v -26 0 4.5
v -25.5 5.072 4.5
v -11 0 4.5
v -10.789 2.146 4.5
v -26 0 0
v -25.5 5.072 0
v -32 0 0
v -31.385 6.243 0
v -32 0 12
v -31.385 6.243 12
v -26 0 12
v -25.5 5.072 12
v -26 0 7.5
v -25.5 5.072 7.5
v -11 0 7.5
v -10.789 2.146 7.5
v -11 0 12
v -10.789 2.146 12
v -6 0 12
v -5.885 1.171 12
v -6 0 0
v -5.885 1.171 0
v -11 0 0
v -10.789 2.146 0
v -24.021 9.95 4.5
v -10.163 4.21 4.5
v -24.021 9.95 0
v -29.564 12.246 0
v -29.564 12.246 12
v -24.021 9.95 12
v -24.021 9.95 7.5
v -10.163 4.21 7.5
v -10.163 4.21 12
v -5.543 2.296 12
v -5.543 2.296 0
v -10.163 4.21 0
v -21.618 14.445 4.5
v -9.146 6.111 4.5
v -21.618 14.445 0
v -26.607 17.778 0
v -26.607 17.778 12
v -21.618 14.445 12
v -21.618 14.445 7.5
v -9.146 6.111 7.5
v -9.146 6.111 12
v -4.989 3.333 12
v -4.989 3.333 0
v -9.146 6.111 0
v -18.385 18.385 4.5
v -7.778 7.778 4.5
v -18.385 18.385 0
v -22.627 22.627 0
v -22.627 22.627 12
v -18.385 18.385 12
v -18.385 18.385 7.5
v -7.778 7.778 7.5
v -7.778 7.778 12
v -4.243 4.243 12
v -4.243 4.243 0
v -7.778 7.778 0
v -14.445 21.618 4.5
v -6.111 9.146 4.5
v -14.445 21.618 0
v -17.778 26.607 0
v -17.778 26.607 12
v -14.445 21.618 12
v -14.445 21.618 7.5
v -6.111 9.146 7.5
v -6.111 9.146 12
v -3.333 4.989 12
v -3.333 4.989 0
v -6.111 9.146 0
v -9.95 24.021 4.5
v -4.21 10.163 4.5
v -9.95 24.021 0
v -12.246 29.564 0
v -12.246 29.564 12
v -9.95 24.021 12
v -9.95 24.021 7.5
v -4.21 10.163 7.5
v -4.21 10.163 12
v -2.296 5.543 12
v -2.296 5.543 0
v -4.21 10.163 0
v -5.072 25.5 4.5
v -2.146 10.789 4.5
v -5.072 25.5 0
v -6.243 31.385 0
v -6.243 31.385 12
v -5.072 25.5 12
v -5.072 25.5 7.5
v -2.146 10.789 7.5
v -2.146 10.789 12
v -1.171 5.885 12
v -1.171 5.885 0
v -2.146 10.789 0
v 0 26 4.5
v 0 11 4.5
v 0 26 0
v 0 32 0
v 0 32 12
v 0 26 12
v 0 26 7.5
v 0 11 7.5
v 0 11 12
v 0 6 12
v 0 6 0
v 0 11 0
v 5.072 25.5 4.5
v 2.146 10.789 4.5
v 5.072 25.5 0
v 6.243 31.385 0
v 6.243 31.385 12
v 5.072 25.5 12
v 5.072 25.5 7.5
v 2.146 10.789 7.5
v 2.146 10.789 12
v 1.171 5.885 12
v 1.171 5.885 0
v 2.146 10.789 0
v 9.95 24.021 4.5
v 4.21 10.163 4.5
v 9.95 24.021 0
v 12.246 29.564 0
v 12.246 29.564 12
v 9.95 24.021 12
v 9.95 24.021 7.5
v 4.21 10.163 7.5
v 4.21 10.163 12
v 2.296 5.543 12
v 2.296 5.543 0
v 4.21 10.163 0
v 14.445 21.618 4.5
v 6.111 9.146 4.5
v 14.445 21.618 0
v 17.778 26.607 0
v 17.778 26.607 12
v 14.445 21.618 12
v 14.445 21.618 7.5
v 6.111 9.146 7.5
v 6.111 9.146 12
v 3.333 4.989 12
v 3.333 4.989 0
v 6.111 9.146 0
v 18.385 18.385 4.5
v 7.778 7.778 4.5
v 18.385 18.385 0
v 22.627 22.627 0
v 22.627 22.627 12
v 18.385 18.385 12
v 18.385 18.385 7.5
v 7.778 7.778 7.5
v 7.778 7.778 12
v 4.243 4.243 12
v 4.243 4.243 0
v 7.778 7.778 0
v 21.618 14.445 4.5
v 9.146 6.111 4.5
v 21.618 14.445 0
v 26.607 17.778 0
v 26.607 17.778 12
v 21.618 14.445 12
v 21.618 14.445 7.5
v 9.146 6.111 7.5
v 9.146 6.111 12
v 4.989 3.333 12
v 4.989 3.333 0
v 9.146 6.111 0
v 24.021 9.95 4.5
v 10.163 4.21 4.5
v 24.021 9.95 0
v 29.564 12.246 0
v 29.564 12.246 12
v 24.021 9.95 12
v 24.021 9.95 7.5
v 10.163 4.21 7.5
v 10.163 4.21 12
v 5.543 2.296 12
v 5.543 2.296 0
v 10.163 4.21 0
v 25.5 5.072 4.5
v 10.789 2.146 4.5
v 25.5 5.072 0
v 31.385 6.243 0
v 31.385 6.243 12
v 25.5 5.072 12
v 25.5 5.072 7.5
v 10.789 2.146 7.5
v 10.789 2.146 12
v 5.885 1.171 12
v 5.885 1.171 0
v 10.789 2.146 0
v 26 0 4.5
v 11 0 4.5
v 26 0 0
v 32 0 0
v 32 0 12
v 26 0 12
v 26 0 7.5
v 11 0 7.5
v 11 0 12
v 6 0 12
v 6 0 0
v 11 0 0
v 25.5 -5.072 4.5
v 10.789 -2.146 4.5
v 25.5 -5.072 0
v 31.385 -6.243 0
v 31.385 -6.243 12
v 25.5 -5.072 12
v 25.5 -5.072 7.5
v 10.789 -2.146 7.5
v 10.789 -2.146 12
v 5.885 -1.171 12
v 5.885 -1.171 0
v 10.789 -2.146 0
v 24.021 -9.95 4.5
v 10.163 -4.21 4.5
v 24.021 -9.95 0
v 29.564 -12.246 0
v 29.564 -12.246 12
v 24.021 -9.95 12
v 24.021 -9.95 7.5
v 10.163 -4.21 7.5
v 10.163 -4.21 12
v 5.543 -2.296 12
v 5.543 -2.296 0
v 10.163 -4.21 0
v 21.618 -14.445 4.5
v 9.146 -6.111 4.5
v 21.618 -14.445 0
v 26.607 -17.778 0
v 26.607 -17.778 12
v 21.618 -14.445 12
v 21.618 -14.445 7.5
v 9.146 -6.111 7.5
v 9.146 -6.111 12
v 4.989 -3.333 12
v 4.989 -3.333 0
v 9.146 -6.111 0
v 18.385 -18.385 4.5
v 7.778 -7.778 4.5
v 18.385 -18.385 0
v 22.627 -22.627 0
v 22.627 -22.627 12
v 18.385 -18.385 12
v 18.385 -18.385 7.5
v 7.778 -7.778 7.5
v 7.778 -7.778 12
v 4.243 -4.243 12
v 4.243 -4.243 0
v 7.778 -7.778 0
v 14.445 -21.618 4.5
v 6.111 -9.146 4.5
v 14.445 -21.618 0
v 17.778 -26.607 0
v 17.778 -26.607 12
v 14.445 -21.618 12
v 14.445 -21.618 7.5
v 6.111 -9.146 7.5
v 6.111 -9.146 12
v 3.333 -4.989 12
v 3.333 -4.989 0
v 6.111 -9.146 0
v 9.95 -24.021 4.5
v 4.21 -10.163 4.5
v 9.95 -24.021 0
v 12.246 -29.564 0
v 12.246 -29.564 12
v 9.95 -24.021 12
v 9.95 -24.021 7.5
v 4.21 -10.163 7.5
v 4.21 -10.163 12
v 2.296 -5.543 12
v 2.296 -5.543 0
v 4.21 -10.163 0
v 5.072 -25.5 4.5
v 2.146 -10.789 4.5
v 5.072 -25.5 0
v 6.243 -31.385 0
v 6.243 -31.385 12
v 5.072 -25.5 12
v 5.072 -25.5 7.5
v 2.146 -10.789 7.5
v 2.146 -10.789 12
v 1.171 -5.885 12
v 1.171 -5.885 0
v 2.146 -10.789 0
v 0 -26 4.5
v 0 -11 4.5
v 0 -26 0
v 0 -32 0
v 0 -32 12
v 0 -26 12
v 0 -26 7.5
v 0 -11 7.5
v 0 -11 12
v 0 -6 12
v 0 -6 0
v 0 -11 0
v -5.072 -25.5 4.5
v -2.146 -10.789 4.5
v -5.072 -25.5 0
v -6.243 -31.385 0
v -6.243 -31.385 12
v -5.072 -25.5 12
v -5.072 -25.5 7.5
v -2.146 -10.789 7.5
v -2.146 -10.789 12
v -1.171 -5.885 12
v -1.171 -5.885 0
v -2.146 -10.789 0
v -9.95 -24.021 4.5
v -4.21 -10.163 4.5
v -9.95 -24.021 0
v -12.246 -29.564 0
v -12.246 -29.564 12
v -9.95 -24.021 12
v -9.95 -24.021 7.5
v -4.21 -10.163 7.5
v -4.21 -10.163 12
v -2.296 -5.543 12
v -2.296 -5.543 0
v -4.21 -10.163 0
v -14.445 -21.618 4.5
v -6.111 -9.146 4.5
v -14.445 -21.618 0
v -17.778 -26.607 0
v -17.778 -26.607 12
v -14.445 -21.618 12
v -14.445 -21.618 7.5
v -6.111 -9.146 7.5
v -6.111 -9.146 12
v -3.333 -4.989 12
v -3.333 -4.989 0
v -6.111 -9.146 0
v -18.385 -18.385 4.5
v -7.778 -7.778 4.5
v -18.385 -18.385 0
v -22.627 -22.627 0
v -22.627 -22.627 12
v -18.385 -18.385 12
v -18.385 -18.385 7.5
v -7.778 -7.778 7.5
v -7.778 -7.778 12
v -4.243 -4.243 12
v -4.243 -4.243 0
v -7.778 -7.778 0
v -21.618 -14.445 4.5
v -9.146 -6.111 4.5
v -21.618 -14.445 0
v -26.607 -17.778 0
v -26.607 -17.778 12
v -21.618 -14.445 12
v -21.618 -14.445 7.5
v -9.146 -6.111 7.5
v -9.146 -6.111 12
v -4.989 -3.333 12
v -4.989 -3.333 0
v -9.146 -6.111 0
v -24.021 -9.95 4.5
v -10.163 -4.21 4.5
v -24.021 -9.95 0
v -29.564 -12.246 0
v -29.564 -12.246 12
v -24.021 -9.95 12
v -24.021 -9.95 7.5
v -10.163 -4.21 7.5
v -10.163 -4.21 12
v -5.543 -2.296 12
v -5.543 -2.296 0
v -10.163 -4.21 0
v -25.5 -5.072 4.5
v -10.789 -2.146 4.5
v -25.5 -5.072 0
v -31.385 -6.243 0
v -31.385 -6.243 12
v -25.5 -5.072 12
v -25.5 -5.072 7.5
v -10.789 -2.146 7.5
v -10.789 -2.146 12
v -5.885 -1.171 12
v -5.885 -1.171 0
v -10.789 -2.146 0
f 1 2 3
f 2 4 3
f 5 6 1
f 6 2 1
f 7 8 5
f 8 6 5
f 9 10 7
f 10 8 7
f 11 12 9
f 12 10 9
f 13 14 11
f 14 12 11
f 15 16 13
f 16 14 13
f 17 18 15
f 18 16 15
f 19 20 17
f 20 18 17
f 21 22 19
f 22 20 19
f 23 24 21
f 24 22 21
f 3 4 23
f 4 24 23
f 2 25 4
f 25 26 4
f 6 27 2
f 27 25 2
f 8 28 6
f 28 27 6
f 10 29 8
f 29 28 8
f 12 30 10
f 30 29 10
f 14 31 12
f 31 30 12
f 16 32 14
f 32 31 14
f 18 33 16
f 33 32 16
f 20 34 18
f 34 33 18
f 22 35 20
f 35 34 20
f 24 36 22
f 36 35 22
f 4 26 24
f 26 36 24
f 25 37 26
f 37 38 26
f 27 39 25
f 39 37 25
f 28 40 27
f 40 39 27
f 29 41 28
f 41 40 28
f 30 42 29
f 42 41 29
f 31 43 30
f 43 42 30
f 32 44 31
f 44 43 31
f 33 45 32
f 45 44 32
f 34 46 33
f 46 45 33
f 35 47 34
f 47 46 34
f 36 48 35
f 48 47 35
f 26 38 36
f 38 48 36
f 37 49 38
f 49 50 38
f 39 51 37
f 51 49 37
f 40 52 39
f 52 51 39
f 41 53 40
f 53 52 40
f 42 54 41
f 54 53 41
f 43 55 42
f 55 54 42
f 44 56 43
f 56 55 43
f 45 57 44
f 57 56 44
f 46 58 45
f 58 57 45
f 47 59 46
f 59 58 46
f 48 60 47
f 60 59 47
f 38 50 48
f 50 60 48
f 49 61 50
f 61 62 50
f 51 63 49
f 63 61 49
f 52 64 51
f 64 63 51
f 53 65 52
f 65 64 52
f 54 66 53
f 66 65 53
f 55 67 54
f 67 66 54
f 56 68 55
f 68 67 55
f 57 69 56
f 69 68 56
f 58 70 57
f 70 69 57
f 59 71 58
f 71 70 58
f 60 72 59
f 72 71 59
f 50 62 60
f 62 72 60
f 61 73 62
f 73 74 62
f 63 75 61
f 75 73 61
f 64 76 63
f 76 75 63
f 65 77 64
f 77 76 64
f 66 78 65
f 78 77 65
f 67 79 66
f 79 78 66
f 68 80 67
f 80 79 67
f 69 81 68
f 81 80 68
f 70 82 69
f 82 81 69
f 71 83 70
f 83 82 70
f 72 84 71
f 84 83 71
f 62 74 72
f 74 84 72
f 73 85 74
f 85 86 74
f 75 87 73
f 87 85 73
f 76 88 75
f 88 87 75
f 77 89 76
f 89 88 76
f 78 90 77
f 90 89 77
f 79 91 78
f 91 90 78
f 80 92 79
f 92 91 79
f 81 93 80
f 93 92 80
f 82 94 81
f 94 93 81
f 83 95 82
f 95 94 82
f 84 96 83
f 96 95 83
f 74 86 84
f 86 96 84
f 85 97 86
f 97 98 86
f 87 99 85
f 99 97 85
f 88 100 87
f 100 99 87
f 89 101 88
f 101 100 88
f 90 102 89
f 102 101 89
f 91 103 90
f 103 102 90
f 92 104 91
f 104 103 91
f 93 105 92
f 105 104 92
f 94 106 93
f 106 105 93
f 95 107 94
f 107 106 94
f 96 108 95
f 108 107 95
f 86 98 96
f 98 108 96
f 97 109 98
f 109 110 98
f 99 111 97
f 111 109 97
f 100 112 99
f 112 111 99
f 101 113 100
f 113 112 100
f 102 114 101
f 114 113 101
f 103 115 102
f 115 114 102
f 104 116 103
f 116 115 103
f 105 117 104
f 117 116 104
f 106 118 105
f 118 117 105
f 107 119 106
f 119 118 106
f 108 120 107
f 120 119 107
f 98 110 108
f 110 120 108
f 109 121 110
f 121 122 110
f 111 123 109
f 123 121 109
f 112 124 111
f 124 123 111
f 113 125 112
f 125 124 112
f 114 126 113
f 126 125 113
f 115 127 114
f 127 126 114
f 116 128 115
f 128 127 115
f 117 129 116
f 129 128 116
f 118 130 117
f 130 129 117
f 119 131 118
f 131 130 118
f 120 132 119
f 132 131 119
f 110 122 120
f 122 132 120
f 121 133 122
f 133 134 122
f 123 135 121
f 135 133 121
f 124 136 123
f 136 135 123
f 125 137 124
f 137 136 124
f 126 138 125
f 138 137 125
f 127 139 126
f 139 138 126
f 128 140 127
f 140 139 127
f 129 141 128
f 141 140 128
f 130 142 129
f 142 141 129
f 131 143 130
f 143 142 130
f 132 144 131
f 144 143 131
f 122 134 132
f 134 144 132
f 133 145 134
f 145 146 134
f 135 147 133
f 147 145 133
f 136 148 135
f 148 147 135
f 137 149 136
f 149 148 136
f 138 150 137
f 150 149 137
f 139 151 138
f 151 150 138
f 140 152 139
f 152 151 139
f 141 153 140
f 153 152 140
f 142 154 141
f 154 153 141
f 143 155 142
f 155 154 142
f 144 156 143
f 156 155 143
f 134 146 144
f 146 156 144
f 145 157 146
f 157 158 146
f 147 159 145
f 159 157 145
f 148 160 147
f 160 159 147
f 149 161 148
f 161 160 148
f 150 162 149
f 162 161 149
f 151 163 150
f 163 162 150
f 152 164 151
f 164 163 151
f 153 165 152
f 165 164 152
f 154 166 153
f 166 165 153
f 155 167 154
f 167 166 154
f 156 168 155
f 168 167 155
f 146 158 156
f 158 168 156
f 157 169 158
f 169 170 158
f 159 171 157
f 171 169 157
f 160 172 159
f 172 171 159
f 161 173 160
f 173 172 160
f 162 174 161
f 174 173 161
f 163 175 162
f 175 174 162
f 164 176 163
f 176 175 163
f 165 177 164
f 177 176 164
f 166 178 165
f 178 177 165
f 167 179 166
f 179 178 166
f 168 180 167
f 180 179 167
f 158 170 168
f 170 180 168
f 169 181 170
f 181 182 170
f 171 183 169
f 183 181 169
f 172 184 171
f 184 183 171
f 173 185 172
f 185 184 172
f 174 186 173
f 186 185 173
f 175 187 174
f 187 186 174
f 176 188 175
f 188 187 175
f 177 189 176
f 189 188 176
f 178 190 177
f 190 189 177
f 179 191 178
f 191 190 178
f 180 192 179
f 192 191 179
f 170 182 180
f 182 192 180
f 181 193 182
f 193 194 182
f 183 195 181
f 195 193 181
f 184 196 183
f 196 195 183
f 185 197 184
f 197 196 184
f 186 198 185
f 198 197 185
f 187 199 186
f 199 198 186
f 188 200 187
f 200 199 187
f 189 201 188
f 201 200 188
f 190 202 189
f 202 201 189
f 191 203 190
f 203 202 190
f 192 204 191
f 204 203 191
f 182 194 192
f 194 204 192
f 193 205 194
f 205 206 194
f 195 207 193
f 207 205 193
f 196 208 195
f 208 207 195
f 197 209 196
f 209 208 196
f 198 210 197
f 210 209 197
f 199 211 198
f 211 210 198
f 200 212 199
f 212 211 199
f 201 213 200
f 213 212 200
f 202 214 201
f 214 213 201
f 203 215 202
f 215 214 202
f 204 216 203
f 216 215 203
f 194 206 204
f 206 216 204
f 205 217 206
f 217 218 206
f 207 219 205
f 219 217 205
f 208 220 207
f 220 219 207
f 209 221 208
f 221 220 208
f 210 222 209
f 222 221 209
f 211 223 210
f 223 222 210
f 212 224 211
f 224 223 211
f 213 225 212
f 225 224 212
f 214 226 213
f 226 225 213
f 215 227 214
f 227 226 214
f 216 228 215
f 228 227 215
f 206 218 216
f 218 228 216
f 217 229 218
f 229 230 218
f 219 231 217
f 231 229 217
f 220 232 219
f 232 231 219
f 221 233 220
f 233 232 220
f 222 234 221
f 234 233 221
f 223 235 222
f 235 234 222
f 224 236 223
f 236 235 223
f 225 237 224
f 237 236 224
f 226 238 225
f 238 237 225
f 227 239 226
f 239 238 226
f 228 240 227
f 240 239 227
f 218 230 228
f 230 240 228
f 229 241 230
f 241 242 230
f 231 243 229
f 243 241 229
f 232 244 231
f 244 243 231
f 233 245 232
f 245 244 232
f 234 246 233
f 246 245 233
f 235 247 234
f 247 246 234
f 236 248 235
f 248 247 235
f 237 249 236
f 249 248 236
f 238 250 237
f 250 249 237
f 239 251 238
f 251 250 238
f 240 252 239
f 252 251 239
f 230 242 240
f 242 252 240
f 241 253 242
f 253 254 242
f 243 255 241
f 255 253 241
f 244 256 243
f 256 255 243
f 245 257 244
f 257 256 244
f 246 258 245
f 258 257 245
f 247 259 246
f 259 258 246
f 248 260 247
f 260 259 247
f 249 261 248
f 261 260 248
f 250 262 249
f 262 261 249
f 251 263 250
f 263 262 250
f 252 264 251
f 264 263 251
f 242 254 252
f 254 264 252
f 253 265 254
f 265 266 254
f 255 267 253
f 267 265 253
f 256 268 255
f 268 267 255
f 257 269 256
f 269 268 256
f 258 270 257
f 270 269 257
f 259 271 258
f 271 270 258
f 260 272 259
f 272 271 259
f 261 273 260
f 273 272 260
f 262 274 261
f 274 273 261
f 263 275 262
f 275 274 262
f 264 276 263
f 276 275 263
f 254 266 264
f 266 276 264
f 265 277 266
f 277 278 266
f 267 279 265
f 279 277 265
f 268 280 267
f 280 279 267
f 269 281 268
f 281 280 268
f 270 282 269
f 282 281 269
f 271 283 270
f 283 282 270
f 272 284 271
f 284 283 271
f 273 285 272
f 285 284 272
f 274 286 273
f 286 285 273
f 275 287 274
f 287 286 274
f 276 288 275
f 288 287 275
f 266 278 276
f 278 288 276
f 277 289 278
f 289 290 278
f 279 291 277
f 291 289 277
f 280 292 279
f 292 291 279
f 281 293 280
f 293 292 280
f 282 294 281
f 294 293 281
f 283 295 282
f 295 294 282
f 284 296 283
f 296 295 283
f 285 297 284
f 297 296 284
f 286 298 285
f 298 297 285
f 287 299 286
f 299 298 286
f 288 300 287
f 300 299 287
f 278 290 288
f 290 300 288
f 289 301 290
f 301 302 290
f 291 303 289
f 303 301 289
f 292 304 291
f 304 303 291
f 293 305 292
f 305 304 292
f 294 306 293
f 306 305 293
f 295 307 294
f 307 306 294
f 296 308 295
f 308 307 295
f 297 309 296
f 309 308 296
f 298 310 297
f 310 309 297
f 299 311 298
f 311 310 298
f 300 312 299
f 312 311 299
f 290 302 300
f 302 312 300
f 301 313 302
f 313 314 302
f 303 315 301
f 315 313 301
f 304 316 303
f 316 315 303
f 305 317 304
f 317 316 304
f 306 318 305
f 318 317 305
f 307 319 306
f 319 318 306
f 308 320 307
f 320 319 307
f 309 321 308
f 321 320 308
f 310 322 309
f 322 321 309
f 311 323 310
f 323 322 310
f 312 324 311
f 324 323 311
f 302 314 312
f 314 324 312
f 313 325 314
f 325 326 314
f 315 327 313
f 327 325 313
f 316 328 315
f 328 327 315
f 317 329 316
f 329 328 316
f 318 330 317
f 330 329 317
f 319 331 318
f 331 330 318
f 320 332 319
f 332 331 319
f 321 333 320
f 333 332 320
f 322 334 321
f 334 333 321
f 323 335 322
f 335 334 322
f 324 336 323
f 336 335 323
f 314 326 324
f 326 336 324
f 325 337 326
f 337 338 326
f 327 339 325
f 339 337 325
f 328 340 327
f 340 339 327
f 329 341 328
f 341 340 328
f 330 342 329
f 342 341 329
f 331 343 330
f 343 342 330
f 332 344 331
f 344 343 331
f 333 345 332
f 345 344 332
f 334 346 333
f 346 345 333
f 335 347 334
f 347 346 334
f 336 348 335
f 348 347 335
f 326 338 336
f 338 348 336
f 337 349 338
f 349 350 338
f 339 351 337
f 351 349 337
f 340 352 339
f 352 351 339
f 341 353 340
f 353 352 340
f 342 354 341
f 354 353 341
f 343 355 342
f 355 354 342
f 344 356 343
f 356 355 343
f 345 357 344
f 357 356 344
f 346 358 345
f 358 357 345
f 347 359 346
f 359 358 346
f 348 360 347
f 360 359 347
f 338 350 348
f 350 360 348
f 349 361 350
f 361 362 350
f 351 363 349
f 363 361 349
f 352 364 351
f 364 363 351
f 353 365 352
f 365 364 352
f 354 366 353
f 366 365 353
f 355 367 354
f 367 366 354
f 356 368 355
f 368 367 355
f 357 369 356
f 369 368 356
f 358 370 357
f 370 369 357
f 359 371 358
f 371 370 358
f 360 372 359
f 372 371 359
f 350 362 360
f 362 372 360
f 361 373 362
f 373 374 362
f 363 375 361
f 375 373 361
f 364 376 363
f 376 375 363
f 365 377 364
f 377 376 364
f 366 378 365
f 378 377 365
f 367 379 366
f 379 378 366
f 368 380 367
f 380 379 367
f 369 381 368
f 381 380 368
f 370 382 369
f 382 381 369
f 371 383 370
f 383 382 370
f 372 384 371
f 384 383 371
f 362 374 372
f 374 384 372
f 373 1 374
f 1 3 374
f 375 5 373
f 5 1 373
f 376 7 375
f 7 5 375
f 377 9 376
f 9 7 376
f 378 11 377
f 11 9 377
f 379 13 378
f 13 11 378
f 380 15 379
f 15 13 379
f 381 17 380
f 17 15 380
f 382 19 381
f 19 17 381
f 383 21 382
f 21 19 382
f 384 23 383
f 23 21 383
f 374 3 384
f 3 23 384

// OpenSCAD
$fn = 32;

// ----------------------------------------------------------------------
// Revolved part: handwheel R32
// ----------------------------------------------------------------------

// --- parameters (mm) ---
bore_r = 6;               // bore radius
rim_r = 32;               // rim radius
rim_w = 6;                // rim axial width
rim_t = 12;               // rim diameter height
hub_r = 11;               // hub radius
web_t = 3;                // web thickness
revolve_angle = 360;      // revolve sweep, degrees
fit_tol = 0.05;           // declared fit tolerance (prompt contract)
free_tol = 0.2;           // declared free tolerance (prompt contract)

bore_d = 2 * bore_r;
rim_d = 2 * rim_r;
hub_d = 2 * hub_r;

profile = [[6, 0], [11, 0], [11, 4.5], [26, 4.5], [26, 0], [32, 0], [32, 12], [26, 12], [26, 7.5], [11, 7.5], [11, 12], [6, 12]];  // primary outline, 12 points, counter clockwise

// --- the one profile operation ---
rotate_extrude(angle = revolve_angle) polygon(points = profile);
